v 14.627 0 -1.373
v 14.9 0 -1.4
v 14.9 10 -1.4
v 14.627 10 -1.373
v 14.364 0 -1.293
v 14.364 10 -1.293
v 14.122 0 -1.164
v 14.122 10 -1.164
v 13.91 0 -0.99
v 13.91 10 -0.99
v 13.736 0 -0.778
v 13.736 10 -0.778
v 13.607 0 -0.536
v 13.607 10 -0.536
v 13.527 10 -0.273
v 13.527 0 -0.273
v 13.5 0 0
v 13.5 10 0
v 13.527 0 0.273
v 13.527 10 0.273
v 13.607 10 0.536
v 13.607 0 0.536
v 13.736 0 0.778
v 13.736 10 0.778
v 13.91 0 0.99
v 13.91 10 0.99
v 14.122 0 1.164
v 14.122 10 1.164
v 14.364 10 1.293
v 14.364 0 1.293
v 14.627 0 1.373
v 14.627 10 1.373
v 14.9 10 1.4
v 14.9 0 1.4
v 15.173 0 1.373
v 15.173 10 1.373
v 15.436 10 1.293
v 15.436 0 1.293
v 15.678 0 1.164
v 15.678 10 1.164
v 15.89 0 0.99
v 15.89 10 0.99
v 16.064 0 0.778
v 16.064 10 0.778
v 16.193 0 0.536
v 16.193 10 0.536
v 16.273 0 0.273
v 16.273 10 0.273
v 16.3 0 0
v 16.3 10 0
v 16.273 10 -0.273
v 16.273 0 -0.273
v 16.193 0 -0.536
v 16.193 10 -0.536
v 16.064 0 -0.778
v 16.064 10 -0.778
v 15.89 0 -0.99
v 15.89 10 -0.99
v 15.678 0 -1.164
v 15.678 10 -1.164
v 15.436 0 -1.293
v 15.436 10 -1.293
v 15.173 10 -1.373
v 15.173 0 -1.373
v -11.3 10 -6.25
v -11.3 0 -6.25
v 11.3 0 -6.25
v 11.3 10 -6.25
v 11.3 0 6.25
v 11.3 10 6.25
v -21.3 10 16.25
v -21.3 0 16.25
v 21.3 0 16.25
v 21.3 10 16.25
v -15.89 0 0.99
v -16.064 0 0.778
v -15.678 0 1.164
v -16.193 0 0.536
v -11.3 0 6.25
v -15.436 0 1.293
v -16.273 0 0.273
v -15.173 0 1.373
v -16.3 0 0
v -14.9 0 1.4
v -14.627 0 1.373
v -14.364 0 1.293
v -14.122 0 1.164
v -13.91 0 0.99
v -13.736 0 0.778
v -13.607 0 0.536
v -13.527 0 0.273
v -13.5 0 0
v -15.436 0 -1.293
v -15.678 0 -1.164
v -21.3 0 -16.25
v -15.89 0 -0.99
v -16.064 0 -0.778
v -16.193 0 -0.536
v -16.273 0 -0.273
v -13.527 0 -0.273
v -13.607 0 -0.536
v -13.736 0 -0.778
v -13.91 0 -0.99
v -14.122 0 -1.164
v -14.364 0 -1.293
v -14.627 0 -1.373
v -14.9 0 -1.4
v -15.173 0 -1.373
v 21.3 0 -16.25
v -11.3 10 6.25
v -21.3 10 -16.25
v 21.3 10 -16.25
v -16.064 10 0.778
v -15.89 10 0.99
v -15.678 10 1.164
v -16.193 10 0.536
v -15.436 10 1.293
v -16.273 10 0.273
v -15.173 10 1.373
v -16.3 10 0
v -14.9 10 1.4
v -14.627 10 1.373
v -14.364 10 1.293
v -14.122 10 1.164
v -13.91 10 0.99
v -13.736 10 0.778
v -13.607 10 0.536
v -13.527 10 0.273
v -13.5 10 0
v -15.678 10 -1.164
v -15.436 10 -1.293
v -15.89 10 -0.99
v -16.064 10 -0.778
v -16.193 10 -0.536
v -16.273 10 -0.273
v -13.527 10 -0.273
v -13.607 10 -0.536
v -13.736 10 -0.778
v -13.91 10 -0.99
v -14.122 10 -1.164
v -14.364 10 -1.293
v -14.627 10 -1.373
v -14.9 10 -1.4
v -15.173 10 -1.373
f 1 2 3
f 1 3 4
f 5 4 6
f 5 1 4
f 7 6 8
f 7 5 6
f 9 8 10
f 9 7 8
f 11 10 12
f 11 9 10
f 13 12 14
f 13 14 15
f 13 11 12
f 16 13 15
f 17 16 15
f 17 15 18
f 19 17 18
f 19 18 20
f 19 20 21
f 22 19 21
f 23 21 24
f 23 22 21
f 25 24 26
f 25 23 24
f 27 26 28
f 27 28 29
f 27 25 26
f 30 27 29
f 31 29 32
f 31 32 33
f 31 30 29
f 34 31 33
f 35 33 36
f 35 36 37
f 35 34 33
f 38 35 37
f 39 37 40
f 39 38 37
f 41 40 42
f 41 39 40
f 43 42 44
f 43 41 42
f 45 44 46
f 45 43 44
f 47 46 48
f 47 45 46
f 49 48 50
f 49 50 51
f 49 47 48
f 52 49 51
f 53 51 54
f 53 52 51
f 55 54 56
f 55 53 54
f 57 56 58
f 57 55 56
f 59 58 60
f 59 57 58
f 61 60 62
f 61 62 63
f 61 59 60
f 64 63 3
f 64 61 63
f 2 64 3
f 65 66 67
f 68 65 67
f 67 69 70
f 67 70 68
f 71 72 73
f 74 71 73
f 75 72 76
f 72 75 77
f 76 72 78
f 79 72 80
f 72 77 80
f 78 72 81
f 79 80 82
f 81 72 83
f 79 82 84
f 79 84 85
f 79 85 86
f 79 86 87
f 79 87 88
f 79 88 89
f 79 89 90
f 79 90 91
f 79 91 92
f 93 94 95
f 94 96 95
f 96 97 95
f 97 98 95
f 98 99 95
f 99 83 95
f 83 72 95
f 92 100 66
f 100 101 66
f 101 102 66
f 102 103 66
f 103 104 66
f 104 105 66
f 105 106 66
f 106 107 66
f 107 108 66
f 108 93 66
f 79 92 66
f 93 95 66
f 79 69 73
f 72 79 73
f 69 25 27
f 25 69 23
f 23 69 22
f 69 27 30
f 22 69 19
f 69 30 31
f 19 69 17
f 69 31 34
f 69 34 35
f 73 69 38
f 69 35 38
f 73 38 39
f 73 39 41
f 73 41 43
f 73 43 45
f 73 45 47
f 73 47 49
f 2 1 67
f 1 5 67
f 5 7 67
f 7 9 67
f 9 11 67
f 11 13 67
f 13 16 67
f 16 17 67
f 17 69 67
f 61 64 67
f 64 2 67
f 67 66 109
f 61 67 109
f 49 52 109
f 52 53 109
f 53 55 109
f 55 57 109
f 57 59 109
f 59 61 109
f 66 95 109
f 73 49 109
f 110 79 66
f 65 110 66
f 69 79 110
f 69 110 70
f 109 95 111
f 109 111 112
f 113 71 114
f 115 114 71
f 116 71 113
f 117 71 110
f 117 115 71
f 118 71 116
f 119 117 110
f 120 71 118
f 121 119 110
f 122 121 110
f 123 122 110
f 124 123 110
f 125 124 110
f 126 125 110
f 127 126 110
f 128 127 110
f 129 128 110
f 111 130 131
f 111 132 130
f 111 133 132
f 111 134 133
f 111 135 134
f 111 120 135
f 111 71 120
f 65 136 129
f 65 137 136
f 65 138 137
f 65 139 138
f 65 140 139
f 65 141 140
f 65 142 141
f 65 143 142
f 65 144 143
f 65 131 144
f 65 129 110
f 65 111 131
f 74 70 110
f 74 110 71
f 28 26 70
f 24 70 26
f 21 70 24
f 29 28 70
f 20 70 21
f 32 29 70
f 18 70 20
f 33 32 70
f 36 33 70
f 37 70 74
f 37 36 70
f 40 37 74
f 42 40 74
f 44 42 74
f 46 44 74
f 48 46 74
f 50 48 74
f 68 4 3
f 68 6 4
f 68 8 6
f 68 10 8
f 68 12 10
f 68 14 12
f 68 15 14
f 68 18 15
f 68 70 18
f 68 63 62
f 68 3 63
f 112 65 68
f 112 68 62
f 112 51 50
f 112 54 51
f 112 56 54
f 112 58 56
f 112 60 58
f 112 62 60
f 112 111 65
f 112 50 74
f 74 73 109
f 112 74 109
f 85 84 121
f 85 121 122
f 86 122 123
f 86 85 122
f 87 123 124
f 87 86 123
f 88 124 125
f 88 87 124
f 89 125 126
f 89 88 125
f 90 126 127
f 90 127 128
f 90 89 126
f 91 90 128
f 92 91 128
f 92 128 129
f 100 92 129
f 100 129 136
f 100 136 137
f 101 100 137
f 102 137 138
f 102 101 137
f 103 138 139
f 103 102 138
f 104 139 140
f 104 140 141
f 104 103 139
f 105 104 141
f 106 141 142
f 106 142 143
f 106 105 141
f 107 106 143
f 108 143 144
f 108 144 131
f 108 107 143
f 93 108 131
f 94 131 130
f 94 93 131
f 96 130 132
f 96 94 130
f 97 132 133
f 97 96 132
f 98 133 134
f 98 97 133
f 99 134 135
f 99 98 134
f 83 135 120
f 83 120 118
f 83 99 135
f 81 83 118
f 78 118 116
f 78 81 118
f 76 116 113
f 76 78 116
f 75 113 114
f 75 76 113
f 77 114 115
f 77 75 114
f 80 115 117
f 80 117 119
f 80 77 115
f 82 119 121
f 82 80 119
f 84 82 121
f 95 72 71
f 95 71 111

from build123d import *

# Parameters (mm, degrees)
SKETCH1_W           = 42.6
SKETCH1_H           = 32.5
SKETCH1_R           = 1.4
SKETCH1_W_2         = 22.6
SKETCH1_H_2         = 12.5
BOSS_EXTRUDE1_DEPTH = 10


with BuildPart() as part:
    # Sketch1 → Boss-Extrude1 (new body)
    with BuildSketch(Plane(origin=(0, 0, 0), x_dir=(1, 0, 0), z_dir=(0, 1, 0))):
        Rectangle(SKETCH1_W, SKETCH1_H)
        with Locations(Location((-14.9, 0, 0), (0, 0, 270))):
            Circle(SKETCH1_R, mode=Mode.SUBTRACT)
        with Locations(Location((14.9, 0, 0), (0, 0, 90))):
            Circle(SKETCH1_R, mode=Mode.SUBTRACT)
        Rectangle(SKETCH1_W_2, SKETCH1_H_2, mode=Mode.SUBTRACT)
    extrude(amount=BOSS_EXTRUDE1_DEPTH)


solid = part.part
